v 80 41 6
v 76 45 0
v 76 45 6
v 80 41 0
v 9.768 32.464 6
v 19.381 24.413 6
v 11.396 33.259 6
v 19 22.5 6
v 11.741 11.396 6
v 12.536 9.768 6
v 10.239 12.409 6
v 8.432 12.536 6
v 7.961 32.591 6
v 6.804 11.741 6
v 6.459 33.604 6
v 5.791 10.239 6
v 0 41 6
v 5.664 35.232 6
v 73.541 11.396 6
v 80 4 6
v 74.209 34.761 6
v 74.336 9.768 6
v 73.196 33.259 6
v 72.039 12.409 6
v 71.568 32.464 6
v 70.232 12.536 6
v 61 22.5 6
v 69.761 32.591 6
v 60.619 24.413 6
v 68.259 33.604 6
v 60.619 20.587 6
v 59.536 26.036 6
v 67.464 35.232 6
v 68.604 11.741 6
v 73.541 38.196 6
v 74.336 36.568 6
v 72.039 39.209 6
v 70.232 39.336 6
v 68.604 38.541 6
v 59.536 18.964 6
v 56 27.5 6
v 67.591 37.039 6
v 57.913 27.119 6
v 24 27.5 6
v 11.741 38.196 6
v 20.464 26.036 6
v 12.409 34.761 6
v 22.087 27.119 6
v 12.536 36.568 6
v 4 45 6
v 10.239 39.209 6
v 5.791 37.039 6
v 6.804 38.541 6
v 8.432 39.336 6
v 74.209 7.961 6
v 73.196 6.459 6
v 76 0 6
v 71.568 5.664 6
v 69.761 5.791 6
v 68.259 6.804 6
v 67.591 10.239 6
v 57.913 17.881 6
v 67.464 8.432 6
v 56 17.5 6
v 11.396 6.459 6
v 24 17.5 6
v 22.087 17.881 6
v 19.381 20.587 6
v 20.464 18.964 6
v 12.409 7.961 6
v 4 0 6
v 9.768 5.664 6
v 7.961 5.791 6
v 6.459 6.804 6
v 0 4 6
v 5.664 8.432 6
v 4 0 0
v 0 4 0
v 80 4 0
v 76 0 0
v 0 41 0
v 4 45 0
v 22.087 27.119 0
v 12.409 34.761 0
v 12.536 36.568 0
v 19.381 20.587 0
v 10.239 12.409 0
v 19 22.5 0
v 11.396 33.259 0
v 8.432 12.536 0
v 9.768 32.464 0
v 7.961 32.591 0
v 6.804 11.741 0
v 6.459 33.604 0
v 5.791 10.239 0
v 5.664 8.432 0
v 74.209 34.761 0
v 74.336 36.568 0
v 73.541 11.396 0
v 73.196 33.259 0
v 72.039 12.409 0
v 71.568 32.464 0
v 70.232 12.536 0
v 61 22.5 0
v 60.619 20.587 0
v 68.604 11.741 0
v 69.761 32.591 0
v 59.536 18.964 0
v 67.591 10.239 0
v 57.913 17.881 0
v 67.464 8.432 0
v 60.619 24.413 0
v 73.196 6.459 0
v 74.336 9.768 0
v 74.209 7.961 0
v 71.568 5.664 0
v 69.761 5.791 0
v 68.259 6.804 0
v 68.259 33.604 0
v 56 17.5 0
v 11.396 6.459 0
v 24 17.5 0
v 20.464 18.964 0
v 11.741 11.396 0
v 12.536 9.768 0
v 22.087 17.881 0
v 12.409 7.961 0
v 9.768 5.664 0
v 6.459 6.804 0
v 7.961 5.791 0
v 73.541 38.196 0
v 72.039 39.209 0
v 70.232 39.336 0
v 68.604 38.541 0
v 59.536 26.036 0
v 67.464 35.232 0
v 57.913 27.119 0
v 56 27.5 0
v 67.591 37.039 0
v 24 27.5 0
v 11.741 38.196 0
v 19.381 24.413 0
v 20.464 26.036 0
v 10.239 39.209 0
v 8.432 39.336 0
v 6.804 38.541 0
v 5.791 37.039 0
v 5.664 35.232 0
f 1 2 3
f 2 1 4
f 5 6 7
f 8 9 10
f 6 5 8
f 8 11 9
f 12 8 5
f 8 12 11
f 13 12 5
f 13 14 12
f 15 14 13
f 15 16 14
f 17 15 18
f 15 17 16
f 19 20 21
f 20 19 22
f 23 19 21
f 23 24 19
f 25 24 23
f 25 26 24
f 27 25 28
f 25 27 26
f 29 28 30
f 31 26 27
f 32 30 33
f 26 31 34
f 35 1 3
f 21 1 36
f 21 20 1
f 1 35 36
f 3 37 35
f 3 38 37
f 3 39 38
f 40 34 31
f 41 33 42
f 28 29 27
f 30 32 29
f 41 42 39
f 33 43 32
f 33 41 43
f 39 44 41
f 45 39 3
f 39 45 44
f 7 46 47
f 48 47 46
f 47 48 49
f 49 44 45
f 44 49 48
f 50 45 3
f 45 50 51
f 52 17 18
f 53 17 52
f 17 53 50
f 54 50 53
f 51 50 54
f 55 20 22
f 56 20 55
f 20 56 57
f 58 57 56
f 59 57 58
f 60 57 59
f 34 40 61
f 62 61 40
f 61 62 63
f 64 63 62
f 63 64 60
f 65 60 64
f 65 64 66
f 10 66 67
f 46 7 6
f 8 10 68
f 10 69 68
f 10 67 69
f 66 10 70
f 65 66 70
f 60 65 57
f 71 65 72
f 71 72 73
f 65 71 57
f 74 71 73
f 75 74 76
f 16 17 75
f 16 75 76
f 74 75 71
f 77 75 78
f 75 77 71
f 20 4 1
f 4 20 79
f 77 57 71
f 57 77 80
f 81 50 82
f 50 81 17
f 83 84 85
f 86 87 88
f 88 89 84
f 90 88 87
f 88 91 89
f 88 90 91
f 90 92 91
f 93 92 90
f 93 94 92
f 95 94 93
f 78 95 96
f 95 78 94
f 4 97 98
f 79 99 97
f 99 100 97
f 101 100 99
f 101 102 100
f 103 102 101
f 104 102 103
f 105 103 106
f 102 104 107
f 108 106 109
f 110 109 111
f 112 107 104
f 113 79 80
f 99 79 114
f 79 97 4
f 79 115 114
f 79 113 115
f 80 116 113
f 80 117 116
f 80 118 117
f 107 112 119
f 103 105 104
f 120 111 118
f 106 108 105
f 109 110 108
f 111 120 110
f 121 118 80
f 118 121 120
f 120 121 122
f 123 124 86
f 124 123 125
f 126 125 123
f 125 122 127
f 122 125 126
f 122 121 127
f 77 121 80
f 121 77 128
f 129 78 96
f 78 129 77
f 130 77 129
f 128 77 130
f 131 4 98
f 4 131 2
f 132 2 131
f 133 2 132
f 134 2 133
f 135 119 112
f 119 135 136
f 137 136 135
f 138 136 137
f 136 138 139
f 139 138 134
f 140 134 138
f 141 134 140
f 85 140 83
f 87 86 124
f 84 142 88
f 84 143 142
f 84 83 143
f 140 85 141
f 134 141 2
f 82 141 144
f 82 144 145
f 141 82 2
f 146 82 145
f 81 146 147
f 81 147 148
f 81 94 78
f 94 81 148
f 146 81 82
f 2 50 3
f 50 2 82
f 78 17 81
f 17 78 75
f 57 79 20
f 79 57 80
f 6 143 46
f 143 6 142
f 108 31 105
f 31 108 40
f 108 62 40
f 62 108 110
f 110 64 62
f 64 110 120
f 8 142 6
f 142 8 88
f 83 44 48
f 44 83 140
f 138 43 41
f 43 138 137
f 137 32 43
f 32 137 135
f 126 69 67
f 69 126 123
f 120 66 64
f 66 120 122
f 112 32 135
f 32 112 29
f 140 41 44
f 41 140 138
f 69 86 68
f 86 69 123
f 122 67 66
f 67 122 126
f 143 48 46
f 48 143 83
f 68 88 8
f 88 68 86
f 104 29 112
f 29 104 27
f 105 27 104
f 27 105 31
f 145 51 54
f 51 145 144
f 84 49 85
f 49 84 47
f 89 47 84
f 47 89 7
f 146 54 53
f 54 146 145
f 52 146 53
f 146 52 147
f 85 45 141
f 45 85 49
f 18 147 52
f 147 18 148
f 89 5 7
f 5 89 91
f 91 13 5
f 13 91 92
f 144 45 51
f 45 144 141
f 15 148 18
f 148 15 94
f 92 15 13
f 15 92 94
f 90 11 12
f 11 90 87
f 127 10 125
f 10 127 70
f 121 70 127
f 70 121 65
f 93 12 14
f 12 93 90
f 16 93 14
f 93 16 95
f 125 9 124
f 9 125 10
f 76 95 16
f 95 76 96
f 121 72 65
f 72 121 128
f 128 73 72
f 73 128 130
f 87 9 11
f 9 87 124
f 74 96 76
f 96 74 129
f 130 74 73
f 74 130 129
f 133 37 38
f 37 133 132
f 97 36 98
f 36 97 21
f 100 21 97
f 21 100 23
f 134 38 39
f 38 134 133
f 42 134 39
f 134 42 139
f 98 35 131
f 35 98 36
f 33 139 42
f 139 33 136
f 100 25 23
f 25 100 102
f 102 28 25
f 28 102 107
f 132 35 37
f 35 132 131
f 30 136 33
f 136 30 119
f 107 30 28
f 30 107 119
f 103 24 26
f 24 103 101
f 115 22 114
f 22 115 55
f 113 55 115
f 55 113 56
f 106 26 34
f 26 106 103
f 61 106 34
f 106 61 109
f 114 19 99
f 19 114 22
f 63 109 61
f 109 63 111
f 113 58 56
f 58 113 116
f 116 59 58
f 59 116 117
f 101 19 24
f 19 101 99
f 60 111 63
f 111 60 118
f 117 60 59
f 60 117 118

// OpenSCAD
$fn = 32;

// ----------------------------------------------------------------------
// Bracket plate: slot plate 80 x 45
// ----------------------------------------------------------------------

// --- parameters (mm) ---
hole_r = 3.5;             // bolt hole radius
plate_t = 6;              // plate thickness, Z (extrusion height)
plate_l = 80;             // plate length
plate_w = 45;             // plate width
slot_l = 32;              // slot straight length
slot_r = 5;               // slot end radius
fit_tol = 0.02;           // declared fit tolerance (prompt contract)
free_tol = 0.2;           // declared free tolerance (prompt contract)

slot_len = slot_l + 2 * slot_r;
slot_w = 2 * slot_r;
hole_d2 = 2 * hole_r;

profile = [[4, 0], [76, 0], [80, 4], [80, 41], [76, 45], [4, 45], [0, 41], [0, 4]];  // primary outline, 8 points, counter clockwise
void_1 = [[56, 17.5], [57.913, 17.881], [59.536, 18.964], [60.619, 20.587], [61, 22.5], [60.619, 24.413], [59.536, 26.036], [57.913, 27.119], [56, 27.5], [24, 27.5], [22.087, 27.119], [20.464, 26.036], [19.381, 24.413], [19, 22.5], [19.381, 20.587], [20.464, 18.964], [22.087, 17.881], [24, 17.5]];  // grip slot, 18 points
void_2 = [[12.536, 36.568], [11.741, 38.196], [10.239, 39.209], [8.432, 39.336], [6.804, 38.541], [5.791, 37.039], [5.664, 35.232], [6.459, 33.604], [7.961, 32.591], [9.768, 32.464], [11.396, 33.259], [12.409, 34.761]];  // corner hole, 12 points
void_3 = [[12.536, 9.768], [11.741, 11.396], [10.239, 12.409], [8.432, 12.536], [6.804, 11.741], [5.791, 10.239], [5.664, 8.432], [6.459, 6.804], [7.961, 5.791], [9.768, 5.664], [11.396, 6.459], [12.409, 7.961]];  // corner hole, 12 points
void_4 = [[74.336, 36.568], [73.541, 38.196], [72.039, 39.209], [70.232, 39.336], [68.604, 38.541], [67.591, 37.039], [67.464, 35.232], [68.259, 33.604], [69.761, 32.591], [71.568, 32.464], [73.196, 33.259], [74.209, 34.761]];  // corner hole, 12 points
void_5 = [[74.336, 9.768], [73.541, 11.396], [72.039, 12.409], [70.232, 12.536], [68.604, 11.741], [67.591, 10.239], [67.464, 8.432], [68.259, 6.804], [69.761, 5.791], [71.568, 5.664], [73.196, 6.459], [74.209, 7.961]];  // corner hole, 12 points

// --- the one profile operation ---
difference() {
  linear_extrude(height = plate_t) polygon(points = profile);
  translate([0, 0, -1])
    linear_extrude(height = plate_t + 2) polygon(points = void_1);
  translate([0, 0, -1])
    linear_extrude(height = plate_t + 2) polygon(points = void_2);
  translate([0, 0, -1])
    linear_extrude(height = plate_t + 2) polygon(points = void_3);
  translate([0, 0, -1])
    linear_extrude(height = plate_t + 2) polygon(points = void_4);
  translate([0, 0, -1])
    linear_extrude(height = plate_t + 2) polygon(points = void_5);
}
